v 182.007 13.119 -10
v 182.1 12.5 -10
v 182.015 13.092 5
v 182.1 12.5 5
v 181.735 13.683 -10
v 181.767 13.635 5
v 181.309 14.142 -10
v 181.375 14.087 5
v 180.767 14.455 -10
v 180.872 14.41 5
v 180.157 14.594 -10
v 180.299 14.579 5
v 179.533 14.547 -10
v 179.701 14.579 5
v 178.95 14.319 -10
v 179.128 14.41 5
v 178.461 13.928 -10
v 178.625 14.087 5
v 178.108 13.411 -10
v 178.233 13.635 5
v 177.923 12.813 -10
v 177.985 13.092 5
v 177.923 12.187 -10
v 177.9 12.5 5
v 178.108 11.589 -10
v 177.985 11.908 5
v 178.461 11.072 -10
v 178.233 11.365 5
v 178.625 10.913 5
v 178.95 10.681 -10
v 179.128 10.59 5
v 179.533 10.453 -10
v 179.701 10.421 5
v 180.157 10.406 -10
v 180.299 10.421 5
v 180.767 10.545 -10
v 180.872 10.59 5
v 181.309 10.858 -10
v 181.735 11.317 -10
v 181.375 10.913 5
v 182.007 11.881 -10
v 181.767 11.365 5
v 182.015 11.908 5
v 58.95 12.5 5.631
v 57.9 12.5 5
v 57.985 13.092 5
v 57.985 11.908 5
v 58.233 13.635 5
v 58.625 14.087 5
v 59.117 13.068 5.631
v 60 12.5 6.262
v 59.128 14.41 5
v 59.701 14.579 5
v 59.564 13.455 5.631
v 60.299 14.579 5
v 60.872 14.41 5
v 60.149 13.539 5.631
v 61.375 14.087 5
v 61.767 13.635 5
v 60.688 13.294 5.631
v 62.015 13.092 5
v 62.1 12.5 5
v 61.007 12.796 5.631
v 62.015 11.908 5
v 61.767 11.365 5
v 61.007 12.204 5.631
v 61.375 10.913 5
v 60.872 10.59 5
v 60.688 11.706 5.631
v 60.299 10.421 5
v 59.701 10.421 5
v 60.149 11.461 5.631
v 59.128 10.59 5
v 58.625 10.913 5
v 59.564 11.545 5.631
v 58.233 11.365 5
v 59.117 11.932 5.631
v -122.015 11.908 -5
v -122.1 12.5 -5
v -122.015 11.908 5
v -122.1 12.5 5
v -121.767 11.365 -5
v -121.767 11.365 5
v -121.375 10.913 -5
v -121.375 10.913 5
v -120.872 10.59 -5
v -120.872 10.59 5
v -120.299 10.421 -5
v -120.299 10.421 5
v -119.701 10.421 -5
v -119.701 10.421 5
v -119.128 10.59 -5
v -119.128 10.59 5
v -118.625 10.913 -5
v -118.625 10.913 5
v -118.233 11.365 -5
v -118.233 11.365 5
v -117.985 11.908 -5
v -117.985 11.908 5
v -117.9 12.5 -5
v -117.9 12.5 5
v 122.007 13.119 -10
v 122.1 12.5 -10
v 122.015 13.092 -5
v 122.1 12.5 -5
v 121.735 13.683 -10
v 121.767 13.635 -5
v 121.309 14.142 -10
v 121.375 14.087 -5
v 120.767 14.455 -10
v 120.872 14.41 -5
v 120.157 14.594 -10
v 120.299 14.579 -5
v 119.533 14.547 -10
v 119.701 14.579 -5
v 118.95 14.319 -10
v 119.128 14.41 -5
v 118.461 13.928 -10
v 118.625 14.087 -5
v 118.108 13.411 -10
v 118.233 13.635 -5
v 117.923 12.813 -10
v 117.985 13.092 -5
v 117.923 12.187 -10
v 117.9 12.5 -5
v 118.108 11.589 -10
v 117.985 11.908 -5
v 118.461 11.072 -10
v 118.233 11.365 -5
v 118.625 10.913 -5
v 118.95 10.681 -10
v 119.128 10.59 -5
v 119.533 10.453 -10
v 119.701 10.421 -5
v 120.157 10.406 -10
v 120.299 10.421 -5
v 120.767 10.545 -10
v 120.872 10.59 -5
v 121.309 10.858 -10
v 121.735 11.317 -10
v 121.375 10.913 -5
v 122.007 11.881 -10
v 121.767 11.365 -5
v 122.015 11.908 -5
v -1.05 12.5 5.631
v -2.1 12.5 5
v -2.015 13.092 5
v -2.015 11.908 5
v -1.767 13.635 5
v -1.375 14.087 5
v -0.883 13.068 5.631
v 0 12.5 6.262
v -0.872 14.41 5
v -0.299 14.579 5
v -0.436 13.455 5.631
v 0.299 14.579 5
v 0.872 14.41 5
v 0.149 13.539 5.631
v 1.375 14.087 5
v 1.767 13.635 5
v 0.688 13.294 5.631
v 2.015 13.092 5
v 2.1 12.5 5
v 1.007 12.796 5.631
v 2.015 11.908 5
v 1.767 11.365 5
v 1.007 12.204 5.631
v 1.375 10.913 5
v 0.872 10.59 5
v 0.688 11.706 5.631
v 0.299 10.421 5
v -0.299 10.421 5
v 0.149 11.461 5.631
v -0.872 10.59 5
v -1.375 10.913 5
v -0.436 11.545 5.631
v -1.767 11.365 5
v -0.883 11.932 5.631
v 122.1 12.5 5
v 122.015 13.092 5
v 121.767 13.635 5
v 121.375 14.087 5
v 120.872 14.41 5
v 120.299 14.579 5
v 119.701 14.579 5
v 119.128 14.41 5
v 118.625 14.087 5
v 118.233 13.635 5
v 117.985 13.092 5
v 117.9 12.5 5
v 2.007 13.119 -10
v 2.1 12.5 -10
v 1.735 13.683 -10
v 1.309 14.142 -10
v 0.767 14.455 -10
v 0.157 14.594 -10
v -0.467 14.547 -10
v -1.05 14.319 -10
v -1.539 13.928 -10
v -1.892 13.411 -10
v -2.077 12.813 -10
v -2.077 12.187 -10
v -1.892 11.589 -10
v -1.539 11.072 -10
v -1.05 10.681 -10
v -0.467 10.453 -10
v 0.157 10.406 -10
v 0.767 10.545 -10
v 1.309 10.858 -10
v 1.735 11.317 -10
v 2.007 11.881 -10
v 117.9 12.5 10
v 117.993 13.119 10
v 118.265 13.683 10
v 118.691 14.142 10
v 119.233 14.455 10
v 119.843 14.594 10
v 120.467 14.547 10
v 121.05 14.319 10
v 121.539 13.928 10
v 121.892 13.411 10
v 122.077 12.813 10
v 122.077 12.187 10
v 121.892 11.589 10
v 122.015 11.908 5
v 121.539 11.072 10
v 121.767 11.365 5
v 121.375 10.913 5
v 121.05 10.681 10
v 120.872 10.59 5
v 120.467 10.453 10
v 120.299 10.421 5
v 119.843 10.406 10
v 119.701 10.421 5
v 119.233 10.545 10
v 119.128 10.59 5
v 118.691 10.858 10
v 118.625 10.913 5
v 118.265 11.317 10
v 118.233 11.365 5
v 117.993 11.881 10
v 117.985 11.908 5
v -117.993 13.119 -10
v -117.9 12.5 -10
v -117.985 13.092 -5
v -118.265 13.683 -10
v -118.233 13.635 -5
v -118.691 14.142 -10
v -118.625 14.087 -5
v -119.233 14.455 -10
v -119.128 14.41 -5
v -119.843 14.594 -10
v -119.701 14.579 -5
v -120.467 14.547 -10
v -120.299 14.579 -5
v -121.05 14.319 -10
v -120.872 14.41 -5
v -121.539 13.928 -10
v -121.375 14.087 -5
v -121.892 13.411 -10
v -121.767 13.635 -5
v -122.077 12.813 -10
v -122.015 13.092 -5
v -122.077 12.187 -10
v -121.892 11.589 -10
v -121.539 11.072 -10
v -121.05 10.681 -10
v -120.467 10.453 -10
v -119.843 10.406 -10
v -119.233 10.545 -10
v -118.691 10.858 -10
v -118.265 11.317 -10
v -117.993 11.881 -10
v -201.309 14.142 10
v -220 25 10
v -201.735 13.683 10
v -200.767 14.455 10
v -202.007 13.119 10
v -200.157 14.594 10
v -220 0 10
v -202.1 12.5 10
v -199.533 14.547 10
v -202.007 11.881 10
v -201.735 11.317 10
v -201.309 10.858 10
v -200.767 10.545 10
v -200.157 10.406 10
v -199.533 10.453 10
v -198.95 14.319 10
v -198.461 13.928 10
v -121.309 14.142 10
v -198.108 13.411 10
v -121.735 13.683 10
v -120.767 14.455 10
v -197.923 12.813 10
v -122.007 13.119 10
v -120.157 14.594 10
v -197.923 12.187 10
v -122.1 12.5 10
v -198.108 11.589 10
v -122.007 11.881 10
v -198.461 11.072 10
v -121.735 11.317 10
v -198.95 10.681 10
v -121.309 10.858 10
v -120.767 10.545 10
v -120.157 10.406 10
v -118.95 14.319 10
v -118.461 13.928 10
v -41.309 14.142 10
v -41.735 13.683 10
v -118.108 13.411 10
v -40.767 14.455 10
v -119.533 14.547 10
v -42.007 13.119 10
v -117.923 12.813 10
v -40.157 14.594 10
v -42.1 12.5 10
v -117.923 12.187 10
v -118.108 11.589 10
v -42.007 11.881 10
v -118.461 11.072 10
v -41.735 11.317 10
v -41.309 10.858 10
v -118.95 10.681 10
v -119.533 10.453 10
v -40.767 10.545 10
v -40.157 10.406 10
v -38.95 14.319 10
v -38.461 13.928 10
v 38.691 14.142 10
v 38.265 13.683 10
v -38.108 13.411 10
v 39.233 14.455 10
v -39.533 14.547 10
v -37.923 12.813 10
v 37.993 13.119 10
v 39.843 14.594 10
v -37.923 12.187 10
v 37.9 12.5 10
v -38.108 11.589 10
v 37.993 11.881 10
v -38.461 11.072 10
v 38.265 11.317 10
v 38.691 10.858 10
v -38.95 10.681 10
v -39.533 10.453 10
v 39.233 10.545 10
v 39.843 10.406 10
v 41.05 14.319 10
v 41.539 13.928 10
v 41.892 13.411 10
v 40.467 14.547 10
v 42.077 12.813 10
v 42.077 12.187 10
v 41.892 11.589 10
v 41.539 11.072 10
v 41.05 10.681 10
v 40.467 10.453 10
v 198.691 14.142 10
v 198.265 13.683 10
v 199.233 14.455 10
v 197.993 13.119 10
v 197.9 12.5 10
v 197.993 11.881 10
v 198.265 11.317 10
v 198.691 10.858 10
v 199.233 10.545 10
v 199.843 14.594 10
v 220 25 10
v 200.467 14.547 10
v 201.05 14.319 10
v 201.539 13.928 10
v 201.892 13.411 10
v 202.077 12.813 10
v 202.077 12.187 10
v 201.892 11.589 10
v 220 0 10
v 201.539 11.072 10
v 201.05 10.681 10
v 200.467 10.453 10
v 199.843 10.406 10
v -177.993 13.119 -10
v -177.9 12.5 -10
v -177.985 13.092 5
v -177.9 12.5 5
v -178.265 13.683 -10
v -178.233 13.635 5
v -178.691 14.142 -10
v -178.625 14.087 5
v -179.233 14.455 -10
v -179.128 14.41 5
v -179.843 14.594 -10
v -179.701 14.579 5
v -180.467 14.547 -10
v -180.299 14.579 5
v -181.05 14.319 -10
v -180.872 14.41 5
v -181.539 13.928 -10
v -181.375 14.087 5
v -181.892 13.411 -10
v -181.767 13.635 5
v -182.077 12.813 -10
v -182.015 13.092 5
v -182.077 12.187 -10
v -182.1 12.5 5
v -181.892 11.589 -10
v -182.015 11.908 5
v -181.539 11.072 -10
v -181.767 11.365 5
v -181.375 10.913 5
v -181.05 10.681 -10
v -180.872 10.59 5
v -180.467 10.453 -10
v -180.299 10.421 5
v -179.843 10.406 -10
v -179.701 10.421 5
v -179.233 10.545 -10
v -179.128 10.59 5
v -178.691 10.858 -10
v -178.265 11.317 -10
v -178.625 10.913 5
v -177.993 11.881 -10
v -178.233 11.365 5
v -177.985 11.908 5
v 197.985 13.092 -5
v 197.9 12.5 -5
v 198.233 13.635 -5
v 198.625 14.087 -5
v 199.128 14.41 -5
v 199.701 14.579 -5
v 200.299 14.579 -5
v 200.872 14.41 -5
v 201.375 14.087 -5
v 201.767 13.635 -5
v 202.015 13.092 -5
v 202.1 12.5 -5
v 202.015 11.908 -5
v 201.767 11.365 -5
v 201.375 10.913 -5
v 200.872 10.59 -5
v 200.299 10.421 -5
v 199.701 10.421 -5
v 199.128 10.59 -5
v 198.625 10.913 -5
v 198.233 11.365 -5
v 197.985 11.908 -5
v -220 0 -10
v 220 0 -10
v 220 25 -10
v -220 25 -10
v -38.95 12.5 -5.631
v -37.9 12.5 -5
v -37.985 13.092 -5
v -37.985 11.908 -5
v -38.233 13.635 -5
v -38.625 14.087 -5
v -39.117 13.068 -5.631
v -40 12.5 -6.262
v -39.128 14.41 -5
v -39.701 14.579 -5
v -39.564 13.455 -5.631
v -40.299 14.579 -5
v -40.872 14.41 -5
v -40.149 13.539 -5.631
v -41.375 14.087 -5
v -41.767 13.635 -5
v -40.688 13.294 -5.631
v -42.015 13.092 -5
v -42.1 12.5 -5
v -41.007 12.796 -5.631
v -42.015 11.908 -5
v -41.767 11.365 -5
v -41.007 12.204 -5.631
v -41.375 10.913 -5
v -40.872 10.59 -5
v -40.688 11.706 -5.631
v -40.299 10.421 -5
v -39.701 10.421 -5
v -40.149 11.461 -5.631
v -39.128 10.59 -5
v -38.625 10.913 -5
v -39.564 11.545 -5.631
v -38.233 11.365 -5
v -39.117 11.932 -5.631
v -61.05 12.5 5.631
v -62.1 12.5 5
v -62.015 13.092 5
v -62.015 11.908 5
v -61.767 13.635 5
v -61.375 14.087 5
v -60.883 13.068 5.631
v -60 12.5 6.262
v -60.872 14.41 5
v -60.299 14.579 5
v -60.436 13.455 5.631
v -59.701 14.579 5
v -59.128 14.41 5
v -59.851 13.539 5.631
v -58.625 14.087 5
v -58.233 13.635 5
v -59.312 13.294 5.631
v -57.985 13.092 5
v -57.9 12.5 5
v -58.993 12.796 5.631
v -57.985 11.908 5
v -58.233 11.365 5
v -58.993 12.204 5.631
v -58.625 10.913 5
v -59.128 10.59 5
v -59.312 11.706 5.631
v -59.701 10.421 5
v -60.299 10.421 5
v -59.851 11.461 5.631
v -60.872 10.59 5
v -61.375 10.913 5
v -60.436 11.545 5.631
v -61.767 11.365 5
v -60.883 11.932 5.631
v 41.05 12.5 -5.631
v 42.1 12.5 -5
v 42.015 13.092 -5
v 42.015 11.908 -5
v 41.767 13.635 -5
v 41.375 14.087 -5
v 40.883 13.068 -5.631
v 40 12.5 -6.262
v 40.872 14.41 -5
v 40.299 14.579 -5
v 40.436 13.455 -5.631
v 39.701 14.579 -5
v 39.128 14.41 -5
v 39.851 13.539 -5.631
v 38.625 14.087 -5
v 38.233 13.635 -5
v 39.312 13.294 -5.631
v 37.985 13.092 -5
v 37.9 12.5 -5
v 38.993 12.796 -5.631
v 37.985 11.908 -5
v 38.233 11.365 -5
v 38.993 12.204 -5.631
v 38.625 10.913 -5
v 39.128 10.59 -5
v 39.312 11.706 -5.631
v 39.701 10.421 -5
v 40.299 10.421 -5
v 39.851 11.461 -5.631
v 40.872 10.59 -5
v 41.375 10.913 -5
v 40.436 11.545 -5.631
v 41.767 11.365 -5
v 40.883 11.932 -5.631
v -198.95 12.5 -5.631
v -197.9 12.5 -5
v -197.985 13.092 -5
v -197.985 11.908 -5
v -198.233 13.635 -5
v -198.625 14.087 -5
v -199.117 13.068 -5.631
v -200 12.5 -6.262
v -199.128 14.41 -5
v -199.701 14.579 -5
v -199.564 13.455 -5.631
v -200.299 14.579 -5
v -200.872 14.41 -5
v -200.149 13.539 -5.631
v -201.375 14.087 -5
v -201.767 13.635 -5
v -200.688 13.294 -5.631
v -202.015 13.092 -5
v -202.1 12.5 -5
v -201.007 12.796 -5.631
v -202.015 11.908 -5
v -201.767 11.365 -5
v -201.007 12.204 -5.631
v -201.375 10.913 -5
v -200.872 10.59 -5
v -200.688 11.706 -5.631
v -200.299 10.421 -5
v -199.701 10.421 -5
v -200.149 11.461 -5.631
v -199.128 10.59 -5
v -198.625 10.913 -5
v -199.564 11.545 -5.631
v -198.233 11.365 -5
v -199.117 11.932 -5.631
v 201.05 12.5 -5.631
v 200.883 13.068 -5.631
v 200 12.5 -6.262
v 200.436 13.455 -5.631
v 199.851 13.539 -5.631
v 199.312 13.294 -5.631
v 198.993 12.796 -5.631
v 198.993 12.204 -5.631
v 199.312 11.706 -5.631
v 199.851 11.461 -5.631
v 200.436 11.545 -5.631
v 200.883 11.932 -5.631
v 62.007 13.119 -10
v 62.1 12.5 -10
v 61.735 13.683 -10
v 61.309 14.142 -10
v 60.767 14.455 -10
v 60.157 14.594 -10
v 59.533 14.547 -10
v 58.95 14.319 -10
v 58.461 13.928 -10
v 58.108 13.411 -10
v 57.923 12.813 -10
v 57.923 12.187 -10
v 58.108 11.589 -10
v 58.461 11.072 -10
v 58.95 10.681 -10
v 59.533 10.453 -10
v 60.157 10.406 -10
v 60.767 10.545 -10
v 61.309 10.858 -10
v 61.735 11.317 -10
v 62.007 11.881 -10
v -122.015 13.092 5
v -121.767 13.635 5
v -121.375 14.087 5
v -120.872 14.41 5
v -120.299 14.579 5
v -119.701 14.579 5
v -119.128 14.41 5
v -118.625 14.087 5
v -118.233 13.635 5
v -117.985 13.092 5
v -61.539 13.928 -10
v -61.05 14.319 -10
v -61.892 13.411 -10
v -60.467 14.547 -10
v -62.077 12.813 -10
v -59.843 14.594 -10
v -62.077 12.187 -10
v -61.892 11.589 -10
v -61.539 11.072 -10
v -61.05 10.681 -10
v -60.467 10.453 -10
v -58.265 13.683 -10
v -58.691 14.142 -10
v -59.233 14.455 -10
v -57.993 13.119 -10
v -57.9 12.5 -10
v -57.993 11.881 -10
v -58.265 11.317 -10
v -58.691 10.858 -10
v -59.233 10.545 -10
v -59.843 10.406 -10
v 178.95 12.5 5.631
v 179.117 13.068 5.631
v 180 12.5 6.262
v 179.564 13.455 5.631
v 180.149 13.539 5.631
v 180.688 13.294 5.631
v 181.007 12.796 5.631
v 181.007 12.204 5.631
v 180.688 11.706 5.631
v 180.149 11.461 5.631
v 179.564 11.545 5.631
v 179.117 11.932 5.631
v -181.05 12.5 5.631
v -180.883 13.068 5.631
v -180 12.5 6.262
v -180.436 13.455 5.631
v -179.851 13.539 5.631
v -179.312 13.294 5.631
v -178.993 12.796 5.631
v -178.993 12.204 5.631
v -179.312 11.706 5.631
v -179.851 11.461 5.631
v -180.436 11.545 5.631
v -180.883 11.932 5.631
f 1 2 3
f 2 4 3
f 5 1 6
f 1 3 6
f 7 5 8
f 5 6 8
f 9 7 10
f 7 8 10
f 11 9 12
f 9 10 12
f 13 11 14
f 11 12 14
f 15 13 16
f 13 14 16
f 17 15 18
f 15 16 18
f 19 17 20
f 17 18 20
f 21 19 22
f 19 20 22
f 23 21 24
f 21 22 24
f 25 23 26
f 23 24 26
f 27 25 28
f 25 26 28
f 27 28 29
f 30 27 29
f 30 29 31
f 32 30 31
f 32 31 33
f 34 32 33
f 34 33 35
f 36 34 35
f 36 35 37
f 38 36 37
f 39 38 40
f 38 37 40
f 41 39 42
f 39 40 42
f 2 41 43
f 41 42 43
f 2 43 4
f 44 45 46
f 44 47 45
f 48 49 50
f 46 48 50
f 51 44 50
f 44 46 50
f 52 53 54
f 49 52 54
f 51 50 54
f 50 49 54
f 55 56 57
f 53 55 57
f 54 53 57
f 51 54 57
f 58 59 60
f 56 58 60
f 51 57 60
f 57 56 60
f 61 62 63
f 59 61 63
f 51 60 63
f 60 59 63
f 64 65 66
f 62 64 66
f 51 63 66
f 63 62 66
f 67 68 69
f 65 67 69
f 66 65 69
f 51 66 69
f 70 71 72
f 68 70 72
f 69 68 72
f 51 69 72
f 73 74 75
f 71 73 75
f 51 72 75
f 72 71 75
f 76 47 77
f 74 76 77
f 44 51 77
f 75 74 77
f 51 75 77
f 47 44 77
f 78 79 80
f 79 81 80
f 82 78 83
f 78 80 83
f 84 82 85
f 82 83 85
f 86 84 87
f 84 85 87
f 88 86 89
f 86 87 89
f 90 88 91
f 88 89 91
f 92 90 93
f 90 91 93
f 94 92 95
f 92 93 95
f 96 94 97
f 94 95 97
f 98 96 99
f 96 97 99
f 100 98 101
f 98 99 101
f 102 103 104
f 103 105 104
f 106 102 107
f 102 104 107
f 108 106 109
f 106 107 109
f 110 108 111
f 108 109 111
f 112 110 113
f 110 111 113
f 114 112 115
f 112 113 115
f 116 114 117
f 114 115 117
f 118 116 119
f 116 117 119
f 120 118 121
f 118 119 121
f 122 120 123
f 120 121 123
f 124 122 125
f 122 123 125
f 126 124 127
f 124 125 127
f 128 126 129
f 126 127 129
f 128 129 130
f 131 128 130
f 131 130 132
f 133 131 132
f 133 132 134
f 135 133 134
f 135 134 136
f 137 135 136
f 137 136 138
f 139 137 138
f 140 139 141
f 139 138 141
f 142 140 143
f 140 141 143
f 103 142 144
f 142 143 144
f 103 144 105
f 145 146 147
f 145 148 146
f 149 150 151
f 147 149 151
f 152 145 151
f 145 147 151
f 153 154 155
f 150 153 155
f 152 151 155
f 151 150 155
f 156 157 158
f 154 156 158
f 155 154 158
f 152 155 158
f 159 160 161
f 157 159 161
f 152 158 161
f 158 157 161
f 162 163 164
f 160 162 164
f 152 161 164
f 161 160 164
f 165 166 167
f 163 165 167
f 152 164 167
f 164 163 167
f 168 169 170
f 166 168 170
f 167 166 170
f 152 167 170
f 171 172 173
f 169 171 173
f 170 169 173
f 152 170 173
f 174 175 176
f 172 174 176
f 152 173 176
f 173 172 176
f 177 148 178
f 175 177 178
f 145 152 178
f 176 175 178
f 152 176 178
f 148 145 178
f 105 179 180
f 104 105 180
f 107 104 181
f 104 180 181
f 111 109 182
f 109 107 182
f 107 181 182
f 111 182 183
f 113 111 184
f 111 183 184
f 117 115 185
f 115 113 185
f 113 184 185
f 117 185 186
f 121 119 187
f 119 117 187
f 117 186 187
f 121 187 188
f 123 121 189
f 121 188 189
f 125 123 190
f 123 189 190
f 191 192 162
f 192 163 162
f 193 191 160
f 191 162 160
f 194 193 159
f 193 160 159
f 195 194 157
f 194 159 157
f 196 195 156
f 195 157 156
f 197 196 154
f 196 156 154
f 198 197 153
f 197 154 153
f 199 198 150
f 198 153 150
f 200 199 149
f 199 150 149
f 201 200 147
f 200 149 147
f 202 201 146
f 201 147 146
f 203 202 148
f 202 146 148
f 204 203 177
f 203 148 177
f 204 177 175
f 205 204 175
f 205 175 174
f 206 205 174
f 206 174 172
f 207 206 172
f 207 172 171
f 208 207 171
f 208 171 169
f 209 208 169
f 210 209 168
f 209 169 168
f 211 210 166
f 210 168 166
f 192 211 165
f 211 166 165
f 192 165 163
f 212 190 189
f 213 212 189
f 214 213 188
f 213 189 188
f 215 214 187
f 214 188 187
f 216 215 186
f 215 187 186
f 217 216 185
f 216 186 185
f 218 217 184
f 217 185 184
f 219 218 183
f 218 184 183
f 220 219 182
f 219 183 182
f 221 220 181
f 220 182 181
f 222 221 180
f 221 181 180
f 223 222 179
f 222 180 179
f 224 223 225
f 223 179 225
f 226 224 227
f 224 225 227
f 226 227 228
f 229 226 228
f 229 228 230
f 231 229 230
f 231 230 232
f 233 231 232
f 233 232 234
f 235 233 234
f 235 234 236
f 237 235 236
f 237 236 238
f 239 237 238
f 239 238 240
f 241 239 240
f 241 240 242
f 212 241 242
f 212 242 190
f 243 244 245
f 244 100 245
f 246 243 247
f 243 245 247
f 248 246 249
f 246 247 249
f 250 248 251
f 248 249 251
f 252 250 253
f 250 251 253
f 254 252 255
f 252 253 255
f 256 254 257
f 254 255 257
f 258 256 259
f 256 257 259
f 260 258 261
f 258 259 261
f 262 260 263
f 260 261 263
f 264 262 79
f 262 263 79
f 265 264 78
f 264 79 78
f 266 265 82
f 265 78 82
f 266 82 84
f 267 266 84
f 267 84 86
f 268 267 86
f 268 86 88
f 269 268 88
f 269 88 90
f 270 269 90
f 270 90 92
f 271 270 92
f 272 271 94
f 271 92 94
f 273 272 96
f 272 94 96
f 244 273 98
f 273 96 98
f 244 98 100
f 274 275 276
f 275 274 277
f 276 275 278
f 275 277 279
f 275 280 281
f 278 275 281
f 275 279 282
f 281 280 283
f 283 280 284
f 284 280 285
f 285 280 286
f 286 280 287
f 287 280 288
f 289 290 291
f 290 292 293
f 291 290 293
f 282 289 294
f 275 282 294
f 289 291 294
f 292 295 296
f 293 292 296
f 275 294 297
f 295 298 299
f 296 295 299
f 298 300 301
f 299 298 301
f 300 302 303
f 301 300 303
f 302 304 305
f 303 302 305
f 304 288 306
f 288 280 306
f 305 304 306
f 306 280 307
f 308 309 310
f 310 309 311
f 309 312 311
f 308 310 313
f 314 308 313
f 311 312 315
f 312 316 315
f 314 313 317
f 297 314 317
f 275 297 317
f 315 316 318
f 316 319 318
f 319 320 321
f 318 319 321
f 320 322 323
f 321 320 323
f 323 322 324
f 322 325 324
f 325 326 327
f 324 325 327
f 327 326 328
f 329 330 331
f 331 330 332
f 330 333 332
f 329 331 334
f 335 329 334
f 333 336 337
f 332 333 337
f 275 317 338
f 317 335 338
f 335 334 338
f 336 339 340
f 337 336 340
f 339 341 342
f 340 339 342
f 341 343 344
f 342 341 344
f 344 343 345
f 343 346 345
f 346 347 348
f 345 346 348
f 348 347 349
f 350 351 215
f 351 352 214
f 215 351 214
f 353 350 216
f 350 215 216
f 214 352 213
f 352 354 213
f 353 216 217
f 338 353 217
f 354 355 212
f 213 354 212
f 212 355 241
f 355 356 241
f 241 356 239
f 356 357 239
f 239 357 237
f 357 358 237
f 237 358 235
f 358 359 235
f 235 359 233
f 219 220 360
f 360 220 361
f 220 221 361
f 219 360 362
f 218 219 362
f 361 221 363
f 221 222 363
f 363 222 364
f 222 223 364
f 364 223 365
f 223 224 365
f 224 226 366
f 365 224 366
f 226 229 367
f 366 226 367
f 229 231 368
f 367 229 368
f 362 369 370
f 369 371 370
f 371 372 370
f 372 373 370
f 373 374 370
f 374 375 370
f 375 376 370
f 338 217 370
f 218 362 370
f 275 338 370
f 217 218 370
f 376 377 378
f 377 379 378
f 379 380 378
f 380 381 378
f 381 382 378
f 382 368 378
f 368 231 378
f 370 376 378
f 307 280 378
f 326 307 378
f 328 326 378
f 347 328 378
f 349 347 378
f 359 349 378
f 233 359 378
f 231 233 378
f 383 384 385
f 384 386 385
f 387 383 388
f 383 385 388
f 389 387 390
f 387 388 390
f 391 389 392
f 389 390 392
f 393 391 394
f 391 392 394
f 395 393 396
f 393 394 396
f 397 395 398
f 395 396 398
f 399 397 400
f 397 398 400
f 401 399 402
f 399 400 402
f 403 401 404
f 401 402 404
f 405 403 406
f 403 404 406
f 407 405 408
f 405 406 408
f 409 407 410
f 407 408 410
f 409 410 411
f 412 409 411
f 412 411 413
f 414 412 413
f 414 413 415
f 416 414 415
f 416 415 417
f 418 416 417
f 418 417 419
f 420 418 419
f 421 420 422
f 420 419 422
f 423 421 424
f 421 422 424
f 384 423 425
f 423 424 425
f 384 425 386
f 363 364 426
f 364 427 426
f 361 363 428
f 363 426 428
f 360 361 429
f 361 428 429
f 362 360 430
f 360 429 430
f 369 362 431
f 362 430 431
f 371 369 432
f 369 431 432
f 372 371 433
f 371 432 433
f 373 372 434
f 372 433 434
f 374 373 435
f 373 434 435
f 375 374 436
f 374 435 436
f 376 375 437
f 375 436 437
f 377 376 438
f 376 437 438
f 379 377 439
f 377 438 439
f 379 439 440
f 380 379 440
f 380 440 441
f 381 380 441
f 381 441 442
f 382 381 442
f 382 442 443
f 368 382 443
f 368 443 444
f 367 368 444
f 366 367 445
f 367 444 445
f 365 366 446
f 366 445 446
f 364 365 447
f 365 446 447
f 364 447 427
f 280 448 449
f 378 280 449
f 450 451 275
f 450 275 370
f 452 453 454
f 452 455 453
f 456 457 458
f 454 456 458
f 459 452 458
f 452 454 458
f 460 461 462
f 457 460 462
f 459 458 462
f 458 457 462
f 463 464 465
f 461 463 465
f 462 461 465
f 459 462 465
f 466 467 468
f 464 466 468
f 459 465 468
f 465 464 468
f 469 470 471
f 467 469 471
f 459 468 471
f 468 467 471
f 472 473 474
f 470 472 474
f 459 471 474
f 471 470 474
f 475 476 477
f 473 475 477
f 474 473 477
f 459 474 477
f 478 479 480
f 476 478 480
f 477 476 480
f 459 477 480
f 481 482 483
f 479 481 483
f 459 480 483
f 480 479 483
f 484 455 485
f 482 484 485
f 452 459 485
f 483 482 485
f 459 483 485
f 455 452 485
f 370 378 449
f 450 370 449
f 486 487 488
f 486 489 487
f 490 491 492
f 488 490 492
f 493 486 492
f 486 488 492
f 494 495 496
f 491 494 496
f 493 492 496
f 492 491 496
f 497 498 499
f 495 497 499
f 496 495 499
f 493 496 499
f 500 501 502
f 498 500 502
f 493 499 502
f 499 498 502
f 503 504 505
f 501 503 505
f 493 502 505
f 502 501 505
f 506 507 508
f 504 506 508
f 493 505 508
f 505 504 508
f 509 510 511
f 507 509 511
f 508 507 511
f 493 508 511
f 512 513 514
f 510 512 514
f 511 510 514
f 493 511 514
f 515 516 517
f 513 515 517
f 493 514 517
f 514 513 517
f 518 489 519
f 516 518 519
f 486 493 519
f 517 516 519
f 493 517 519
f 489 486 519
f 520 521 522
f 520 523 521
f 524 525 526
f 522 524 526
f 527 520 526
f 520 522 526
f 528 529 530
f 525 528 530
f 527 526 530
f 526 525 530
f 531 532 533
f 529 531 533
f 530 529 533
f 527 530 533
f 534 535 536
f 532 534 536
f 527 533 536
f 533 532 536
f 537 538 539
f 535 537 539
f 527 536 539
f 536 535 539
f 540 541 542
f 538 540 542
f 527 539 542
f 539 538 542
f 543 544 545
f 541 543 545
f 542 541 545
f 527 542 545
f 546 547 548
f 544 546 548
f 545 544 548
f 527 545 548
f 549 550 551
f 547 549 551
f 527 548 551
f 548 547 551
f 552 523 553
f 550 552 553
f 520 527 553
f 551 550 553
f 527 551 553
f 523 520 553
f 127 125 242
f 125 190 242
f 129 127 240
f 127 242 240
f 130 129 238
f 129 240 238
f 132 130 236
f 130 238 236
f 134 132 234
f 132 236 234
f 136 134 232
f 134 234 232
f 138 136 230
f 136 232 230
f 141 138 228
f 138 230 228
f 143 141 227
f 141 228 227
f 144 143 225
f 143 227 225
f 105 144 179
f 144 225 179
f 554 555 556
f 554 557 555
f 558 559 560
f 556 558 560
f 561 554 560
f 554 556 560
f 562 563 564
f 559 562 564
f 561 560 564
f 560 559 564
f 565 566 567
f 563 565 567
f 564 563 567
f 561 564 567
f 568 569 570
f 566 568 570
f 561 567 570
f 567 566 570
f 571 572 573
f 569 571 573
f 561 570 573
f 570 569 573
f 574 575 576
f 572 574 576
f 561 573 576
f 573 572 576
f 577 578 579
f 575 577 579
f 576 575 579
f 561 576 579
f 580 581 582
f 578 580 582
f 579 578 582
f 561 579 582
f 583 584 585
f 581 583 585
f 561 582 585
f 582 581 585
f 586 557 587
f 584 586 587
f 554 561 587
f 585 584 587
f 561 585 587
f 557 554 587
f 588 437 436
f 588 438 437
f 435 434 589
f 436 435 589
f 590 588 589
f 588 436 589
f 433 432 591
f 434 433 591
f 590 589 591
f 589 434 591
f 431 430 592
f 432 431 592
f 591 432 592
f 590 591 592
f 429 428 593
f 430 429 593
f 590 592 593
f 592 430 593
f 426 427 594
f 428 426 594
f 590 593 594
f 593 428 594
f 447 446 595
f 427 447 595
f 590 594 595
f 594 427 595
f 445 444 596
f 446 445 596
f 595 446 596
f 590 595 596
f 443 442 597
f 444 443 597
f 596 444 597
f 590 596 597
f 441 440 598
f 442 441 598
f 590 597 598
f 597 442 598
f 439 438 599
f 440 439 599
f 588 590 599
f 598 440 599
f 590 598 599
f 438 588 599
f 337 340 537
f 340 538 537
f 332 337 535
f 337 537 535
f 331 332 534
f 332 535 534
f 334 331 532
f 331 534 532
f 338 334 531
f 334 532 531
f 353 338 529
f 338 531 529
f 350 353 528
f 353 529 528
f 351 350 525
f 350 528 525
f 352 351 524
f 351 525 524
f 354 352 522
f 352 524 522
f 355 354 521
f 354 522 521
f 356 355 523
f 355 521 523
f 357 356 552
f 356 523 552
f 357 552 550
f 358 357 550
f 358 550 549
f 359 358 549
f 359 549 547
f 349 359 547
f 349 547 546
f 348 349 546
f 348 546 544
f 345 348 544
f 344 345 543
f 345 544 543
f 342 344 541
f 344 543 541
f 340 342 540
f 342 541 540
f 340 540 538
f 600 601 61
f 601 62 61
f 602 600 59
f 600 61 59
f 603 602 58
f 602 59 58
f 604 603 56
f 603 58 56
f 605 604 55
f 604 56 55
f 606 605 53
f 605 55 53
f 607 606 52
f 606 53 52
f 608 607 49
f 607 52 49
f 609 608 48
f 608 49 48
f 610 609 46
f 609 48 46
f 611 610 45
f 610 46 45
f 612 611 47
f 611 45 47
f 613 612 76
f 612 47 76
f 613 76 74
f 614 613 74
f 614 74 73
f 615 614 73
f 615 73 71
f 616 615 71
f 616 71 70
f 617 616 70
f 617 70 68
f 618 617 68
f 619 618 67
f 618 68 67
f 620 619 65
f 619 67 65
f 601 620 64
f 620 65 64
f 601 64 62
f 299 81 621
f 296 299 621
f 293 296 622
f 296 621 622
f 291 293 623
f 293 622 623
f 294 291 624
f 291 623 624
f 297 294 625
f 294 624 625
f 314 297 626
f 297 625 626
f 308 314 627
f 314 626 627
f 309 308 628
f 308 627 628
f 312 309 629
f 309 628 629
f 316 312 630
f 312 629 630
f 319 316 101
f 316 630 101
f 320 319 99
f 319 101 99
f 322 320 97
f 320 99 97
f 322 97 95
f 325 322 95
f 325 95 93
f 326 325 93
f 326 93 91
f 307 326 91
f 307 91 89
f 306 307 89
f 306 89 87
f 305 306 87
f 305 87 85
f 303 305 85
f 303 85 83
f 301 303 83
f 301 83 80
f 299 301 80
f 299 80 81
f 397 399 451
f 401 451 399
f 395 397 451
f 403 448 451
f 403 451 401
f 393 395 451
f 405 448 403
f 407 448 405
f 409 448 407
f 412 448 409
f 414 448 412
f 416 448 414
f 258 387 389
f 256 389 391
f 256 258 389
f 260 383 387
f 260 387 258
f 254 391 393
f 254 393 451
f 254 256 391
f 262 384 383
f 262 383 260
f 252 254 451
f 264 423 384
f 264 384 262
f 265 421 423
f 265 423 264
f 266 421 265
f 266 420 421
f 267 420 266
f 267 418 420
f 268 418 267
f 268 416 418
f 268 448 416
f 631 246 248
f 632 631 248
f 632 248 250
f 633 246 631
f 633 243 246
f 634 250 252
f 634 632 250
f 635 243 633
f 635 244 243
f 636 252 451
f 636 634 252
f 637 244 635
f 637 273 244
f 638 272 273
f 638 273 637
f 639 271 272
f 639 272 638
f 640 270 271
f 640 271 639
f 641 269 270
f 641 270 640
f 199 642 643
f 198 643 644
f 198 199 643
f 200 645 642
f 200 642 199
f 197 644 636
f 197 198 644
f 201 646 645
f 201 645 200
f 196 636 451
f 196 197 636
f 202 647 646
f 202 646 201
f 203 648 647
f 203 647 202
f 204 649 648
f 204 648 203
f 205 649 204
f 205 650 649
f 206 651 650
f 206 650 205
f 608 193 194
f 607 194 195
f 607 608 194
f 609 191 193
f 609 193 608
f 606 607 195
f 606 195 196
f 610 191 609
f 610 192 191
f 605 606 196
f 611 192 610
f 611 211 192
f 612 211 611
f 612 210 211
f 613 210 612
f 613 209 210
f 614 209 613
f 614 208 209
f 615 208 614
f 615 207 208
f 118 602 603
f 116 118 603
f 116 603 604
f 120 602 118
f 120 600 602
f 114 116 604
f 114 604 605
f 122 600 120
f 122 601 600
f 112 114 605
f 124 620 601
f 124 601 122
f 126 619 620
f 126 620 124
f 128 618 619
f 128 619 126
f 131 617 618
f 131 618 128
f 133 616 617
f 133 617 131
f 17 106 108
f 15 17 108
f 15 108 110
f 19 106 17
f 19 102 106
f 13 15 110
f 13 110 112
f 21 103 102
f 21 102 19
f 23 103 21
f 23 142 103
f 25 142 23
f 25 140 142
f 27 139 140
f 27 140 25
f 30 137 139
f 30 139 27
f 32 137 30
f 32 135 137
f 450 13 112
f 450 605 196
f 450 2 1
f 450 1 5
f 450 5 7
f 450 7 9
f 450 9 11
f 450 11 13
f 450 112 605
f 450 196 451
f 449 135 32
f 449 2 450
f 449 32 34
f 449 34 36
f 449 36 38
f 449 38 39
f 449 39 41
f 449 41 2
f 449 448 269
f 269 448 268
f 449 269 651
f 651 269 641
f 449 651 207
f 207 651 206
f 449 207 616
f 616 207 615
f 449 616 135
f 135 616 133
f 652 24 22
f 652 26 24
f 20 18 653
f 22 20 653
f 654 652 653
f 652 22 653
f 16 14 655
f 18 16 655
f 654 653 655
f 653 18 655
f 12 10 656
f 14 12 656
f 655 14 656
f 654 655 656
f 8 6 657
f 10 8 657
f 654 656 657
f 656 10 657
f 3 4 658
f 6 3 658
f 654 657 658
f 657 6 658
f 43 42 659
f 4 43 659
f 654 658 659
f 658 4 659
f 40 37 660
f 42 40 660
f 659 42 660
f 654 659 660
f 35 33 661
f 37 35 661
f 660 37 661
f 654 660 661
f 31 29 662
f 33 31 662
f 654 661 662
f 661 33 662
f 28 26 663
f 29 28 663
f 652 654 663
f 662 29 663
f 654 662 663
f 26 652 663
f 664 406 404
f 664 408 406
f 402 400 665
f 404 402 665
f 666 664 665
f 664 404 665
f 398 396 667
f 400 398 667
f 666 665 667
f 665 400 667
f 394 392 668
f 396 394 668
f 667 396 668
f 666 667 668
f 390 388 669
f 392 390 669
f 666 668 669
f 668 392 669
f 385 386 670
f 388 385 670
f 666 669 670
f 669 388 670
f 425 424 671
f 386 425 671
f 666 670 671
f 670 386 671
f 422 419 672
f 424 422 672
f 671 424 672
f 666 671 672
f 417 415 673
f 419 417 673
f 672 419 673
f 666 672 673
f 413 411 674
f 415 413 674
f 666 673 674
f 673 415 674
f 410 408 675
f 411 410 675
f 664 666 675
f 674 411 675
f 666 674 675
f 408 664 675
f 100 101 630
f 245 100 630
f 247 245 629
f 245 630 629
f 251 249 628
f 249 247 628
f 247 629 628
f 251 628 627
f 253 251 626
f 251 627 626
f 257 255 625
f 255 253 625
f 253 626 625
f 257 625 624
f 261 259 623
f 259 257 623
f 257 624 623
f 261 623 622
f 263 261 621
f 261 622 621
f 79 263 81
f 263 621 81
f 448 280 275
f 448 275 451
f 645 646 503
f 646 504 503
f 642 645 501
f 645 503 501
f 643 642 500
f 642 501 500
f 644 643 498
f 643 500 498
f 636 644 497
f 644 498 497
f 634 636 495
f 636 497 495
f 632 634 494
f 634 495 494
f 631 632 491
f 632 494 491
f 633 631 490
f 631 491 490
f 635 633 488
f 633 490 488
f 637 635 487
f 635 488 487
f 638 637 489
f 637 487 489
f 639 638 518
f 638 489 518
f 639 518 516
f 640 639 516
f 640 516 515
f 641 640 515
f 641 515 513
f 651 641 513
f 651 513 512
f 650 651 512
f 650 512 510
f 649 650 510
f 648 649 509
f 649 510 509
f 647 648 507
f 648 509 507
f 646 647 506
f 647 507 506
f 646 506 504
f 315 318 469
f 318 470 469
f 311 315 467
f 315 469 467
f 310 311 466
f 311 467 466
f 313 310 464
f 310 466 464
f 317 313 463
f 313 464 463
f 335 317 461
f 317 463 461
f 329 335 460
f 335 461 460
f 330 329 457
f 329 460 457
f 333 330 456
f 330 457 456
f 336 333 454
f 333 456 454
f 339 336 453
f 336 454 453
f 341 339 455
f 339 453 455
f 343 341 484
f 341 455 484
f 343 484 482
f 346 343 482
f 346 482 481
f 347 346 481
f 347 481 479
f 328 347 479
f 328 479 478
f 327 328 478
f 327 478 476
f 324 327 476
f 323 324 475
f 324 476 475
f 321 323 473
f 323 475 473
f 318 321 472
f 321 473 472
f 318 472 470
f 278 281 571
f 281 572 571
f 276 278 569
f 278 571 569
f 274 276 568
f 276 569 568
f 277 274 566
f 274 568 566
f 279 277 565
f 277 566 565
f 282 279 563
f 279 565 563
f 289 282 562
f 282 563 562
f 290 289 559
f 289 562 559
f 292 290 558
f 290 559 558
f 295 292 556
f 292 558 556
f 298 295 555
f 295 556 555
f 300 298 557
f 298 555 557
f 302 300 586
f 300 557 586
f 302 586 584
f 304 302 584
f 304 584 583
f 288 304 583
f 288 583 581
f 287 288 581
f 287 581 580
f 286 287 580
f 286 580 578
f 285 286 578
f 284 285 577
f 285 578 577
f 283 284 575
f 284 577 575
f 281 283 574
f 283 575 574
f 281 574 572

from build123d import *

# Parameters (mm, degrees)
SKETCH1_W             = 440
SKETCH1_H             = 20
BOSS_EXTRUDE1_DEPTH   = 25
M5_TAPPED_HOLE1_D     = 4.2
M5_TAPPED_HOLE1_DEPTH = 15
M5_TAPPED_HOLE1_TIP   = 1.2618073
M5_TAPPED_HOLE2_D     = 4.2
M5_TAPPED_HOLE2_DEPTH = 15
M5_TAPPED_HOLE2_TIP   = 1.2618073


with BuildPart() as part:
    # Sketch1 → Boss-Extrude1 (new body)
    with BuildSketch(Plane(origin=(0, 0, 0), x_dir=(1, 0, 0), z_dir=(0, 1, 0))):
        Rectangle(SKETCH1_W, SKETCH1_H)
    extrude(amount=BOSS_EXTRUDE1_DEPTH)

    # M5 Tapped Hole1
    with Locations(Plane(origin=(0, 0, -10), x_dir=(-1, 0, 0), z_dir=(0, 0, -1))):
        with Locations((0, 12.5), (60, 12.5), (120, 12.5), (180, 12.5), (-60, 12.5), (-120, 12.5), (-180, 12.5)):
            Hole(M5_TAPPED_HOLE1_D / 2, depth=M5_TAPPED_HOLE1_DEPTH)
            with Locations((0, 0, -(M5_TAPPED_HOLE1_DEPTH + M5_TAPPED_HOLE1_TIP / 2))):  # 118° drill point
                Cone(0, M5_TAPPED_HOLE1_D / 2, M5_TAPPED_HOLE1_TIP, mode=Mode.SUBTRACT)

    # M5 Tapped Hole2
    with Locations(Plane.XY.offset(10)):
        with Locations((40, 12.5), (120, 12.5), (200, 12.5), (-40, 12.5), (-120, 12.5), (-200, 12.5)):
            Hole(M5_TAPPED_HOLE2_D / 2, depth=M5_TAPPED_HOLE2_DEPTH)
            with Locations((0, 0, -(M5_TAPPED_HOLE2_DEPTH + M5_TAPPED_HOLE2_TIP / 2))):  # 118° drill point
                Cone(0, M5_TAPPED_HOLE2_D / 2, M5_TAPPED_HOLE2_TIP, mode=Mode.SUBTRACT)


solid = part.part
